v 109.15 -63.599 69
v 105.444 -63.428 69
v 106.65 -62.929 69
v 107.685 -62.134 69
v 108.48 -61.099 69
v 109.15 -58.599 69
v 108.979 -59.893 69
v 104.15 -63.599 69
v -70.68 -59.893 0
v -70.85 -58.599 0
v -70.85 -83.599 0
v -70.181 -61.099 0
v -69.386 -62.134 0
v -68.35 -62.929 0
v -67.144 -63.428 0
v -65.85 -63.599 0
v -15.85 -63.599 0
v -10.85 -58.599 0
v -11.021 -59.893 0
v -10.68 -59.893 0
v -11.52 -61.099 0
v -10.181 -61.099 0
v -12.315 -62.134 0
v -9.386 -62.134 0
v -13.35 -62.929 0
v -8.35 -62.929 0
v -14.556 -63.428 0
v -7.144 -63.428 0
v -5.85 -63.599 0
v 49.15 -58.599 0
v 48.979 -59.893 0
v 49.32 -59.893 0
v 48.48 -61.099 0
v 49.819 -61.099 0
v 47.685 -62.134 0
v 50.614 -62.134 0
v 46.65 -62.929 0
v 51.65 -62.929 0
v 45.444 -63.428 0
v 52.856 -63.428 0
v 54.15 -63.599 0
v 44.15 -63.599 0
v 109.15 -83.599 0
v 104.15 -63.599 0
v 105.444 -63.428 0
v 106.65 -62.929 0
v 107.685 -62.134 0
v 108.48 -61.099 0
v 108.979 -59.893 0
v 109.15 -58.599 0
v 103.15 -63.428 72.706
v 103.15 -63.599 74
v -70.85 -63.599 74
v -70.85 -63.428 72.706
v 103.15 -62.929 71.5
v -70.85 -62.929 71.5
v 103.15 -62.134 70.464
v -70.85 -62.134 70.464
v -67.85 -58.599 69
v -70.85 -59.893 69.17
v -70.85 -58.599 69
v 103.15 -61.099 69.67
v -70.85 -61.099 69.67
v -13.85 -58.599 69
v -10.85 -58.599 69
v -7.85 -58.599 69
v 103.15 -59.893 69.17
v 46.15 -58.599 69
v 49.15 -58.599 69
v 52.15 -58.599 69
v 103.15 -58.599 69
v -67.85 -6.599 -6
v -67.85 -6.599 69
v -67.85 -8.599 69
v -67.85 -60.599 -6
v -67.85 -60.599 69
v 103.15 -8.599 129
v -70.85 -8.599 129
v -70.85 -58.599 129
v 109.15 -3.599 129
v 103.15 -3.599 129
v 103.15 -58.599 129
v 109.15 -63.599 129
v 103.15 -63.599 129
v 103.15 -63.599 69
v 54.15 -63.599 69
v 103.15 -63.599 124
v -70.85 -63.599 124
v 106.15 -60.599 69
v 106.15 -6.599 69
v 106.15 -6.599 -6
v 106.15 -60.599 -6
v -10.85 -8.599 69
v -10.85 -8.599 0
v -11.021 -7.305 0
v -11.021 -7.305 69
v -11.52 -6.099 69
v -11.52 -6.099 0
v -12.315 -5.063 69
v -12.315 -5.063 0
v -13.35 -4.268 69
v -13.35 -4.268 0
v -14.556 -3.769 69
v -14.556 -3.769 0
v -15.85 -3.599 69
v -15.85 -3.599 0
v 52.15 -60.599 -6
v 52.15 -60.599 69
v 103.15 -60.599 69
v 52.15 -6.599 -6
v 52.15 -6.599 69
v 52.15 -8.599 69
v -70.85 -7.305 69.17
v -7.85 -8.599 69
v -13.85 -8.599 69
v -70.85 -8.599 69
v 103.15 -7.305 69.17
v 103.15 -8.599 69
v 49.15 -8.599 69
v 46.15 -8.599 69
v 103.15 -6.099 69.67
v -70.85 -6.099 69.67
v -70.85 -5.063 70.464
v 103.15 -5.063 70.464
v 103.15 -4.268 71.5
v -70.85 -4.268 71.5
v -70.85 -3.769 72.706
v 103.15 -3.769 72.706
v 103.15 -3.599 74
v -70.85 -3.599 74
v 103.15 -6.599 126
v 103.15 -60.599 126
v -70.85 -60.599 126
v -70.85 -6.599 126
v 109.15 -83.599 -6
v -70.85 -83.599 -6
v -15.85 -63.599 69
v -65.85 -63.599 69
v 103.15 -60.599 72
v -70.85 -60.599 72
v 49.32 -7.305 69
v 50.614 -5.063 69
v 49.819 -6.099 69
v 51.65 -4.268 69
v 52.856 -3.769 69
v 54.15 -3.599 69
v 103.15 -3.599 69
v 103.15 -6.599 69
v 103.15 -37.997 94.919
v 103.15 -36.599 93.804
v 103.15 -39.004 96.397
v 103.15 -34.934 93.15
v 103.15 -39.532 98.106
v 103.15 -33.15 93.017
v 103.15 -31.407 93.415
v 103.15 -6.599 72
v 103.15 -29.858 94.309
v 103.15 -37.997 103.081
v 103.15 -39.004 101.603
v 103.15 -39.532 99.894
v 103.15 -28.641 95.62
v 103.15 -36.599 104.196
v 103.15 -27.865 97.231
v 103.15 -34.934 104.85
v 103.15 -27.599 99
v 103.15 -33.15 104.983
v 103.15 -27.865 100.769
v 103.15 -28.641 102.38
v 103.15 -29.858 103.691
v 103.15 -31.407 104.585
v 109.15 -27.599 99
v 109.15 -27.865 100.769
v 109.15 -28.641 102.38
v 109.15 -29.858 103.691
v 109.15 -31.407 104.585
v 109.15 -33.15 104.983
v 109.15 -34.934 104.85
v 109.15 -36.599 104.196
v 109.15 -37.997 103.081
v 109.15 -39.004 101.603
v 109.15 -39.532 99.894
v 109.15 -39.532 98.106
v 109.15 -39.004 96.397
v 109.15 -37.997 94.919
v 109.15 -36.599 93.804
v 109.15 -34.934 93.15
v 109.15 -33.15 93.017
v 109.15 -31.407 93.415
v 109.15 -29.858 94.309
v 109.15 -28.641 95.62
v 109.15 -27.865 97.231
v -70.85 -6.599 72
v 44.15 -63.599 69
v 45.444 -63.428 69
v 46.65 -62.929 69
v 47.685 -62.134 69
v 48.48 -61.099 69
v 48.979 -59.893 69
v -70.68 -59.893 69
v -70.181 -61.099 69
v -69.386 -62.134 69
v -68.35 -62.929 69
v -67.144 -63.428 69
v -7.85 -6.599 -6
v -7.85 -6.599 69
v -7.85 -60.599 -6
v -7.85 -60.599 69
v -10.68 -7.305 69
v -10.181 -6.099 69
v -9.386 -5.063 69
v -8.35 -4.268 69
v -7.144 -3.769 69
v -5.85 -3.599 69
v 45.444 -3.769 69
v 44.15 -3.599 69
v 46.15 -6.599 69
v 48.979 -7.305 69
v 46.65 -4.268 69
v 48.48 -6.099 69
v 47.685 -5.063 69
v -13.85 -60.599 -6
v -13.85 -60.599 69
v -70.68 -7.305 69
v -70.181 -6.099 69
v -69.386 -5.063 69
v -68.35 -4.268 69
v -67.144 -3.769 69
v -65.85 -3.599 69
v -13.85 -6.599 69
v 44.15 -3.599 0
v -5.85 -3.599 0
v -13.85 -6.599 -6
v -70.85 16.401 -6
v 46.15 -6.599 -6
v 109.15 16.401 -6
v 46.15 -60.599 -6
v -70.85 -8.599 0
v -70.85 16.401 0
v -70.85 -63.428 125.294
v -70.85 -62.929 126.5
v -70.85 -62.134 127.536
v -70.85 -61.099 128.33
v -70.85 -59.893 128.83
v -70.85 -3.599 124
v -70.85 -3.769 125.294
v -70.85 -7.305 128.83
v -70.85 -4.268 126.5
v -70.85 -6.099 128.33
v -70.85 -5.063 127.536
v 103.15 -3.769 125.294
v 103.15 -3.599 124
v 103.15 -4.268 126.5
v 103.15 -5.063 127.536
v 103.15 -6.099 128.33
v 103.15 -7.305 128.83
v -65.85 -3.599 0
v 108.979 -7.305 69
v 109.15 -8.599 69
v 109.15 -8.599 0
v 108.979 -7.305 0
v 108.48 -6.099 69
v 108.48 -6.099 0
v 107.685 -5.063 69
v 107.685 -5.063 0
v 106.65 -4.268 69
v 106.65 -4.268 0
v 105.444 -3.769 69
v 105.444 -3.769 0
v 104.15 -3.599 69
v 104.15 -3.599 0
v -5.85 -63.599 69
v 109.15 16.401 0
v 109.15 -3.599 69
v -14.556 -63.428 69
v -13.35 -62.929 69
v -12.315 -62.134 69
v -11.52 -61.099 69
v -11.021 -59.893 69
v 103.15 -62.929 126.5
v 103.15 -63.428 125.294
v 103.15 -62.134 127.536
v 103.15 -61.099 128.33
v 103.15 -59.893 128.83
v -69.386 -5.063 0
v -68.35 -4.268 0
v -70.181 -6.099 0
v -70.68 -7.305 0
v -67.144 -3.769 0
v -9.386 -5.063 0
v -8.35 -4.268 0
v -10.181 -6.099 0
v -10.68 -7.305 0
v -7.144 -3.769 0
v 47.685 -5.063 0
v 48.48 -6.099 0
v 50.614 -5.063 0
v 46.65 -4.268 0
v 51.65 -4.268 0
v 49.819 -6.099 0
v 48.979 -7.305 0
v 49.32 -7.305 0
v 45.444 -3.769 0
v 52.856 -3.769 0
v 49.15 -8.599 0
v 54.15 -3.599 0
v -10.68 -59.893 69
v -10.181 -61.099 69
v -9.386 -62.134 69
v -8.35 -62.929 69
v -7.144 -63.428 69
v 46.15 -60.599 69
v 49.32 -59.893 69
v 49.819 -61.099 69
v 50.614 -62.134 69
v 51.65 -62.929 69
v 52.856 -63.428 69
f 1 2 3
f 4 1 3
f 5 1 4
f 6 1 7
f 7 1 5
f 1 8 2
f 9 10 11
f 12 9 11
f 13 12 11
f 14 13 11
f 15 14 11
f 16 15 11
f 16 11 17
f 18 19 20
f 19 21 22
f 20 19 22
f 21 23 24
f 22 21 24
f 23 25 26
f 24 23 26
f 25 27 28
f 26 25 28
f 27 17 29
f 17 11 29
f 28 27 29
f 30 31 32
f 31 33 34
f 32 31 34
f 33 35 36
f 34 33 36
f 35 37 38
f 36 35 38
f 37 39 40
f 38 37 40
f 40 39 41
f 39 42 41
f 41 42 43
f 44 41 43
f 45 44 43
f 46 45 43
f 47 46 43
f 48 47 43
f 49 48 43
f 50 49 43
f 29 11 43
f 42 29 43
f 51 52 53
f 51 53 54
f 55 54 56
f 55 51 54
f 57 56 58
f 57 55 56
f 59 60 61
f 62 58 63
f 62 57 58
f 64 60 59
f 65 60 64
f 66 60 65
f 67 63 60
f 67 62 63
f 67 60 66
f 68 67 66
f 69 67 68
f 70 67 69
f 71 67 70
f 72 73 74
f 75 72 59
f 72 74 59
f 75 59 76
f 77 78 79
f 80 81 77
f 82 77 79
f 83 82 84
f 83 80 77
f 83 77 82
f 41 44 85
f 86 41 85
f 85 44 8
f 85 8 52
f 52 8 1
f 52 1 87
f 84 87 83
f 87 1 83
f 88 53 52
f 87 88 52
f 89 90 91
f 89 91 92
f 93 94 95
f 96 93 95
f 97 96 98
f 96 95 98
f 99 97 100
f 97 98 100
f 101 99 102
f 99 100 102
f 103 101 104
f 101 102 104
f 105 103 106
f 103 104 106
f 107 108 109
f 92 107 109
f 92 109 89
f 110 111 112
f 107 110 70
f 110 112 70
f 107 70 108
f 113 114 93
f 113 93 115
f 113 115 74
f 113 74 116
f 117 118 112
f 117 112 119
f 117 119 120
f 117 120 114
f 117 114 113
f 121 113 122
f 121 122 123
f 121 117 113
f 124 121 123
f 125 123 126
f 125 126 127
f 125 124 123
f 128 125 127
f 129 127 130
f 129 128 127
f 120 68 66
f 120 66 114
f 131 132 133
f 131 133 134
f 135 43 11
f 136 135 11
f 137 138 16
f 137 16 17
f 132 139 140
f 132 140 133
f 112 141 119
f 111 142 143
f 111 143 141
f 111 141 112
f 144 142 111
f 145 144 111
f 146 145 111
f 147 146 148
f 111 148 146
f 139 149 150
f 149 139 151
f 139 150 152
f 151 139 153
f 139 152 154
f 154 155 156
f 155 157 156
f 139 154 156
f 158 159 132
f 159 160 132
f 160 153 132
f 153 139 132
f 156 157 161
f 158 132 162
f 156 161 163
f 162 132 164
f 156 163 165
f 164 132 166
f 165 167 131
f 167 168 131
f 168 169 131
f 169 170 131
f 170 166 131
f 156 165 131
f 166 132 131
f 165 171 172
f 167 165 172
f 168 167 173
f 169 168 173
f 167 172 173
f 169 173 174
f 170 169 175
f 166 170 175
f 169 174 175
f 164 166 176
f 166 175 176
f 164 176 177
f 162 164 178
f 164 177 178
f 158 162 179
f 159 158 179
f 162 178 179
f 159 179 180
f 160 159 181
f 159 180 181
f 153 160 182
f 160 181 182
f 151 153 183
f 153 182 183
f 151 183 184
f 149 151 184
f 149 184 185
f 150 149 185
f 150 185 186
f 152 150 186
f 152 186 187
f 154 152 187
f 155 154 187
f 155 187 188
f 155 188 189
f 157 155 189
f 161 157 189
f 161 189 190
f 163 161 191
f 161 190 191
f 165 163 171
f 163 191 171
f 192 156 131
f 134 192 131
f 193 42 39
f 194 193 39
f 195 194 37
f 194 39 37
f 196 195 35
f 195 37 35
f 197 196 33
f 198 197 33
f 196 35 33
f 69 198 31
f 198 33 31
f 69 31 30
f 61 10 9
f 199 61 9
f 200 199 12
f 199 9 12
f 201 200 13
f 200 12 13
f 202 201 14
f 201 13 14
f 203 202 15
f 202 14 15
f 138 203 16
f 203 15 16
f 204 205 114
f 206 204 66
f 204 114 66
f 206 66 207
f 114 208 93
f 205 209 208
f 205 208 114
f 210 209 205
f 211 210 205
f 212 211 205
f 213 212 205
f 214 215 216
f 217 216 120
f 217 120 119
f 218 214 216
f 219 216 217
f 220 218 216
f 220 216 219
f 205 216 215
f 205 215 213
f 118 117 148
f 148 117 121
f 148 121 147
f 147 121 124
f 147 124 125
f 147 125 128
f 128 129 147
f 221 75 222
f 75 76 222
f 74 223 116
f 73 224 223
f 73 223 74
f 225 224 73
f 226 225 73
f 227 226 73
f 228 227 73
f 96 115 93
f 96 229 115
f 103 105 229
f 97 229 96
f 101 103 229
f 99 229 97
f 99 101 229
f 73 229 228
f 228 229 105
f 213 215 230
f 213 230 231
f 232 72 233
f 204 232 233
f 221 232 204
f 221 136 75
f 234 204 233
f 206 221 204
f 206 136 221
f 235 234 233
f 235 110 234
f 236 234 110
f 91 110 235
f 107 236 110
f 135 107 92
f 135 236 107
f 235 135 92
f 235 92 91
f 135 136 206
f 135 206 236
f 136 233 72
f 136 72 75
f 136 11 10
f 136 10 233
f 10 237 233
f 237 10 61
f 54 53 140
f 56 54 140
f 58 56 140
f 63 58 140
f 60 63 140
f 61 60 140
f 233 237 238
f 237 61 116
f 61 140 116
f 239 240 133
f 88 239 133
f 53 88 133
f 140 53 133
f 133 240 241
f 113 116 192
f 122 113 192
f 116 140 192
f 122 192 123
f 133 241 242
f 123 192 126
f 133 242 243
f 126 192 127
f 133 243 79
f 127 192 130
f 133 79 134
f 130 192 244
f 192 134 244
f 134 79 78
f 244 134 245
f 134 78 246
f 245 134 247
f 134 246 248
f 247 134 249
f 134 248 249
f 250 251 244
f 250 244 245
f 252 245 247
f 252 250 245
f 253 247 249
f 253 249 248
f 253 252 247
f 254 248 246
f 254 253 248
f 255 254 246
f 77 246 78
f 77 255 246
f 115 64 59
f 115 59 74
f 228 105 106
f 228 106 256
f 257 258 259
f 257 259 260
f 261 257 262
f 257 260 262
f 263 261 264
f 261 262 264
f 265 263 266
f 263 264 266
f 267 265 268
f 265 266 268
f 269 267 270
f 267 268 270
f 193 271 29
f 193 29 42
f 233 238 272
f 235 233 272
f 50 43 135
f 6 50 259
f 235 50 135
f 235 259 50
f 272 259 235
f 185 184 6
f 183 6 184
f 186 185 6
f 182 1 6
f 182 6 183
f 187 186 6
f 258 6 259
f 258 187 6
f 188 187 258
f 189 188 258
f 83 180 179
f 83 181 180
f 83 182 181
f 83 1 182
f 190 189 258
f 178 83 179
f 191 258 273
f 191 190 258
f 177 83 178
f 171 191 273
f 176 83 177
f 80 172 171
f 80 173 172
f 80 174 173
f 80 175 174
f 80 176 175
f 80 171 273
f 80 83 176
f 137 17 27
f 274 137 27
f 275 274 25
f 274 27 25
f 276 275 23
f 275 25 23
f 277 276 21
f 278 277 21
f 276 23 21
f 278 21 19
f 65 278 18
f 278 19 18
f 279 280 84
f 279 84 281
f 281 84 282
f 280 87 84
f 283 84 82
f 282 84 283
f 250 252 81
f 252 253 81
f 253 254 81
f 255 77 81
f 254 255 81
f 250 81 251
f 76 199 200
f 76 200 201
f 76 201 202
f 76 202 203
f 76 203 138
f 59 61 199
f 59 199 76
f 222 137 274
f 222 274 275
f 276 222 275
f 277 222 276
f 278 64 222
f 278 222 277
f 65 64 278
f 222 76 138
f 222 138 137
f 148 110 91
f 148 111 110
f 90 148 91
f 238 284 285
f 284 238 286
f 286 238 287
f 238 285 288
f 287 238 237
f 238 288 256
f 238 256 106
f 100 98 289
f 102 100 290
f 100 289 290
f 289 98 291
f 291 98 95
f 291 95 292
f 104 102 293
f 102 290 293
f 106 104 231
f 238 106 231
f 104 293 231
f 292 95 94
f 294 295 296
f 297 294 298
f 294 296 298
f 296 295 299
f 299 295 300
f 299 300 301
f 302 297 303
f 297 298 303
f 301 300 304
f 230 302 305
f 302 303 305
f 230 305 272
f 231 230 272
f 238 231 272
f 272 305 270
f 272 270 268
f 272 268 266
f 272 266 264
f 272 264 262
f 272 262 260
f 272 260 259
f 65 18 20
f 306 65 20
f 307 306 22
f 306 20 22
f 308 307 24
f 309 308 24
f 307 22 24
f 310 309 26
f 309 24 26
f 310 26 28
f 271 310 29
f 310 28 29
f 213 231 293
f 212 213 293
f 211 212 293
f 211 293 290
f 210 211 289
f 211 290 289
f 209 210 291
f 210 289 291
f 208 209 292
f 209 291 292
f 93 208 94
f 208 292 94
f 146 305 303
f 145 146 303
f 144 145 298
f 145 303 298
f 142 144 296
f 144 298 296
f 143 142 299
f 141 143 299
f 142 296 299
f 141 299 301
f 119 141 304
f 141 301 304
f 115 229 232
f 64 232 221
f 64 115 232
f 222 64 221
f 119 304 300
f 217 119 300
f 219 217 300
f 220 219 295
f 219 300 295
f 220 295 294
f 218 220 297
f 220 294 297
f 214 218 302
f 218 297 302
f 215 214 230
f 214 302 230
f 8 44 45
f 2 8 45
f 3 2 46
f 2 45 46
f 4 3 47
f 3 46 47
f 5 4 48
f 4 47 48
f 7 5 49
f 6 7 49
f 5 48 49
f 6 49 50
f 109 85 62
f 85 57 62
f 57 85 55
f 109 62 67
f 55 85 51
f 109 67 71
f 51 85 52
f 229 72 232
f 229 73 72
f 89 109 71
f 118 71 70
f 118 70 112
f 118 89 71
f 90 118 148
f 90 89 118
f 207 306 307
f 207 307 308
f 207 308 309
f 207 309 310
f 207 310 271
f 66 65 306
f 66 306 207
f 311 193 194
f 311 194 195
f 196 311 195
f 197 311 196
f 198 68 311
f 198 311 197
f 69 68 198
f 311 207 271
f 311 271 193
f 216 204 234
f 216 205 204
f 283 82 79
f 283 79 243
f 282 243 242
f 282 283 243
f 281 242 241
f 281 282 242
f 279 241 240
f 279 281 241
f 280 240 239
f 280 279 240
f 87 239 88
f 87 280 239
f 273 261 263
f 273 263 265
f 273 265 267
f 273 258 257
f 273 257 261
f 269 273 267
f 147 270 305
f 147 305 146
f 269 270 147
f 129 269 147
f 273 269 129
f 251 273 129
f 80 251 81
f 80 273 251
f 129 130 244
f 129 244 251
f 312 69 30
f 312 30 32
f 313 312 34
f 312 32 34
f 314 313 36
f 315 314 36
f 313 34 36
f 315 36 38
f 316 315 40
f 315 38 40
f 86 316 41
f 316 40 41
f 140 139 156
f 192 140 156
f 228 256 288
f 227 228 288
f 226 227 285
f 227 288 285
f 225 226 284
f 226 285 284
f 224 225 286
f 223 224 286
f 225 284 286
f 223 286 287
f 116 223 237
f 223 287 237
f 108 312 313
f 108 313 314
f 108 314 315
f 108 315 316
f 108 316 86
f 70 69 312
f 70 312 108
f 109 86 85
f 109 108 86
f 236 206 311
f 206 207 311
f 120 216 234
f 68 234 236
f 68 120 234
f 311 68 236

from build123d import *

# Parameters (mm, degrees)
F0_W     = 54
F0_H     = 54
F1_DEPTH = 69
F2_W     = 54
F2_H     = 54
F3_DEPTH = 6
F4_W     = 54
F4_H     = 54
F5_DEPTH = 180
F6_W     = 60
F6_H     = 60
F6_R     = 6
F7_DEPTH = 6


with BuildPart() as f1:
    # F0 (on Top) → F1 (new body)
    with BuildSketch(Plane.XY):
        with BuildLine():
            ThreePointArc((-10.85040465, -8.5986092687), (-12.314870744, -5.0630753627), (-15.85040465, -3.5986092687))
            Line((-15.85040465, -3.5986092687), (-65.85040465, -3.5986092687))
            ThreePointArc((-65.85040465, -3.5986092687), (-69.3859385559, -5.0630753627), (-70.85040465, -8.5986092687))
            Line((-70.85040465, -8.5986092687), (-70.85040465, -58.5986092687))
            ThreePointArc((-70.85040465, -58.5986092687), (-69.3859385559, -62.1341431746), (-65.85040465, -63.5986092687))
            Line((-65.85040465, -63.5986092687), (-15.85040465, -63.5986092687))
            ThreePointArc((-15.85040465, -63.5986092687), (-12.314870744, -62.1341431746), (-10.85040465, -58.5986092687))
            Line((-10.85040465, -58.5986092687), (-10.85040465, -8.5986092687))
        make_face()
        with Locations((-40.85040465, -33.5986092687)):
            Rectangle(F0_W, F0_H, mode=Mode.SUBTRACT)
        with BuildLine():
            ThreePointArc((-5.85040465, -3.5986092687), (-9.3859385559, -5.0630753627), (-10.85040465, -8.5986092687))
            Line((-10.85040465, -8.5986092687), (-10.85040465, -58.5986092687))
            ThreePointArc((-10.85040465, -58.5986092687), (-9.3859385559, -62.1341431746), (-5.85040465, -63.5986092687))
            Line((-5.85040465, -63.5986092687), (44.14959535, -63.5986092687))
            ThreePointArc((44.14959535, -63.5986092687), (47.685129256, -62.1341431746), (49.14959535, -58.5986092687))
            Line((49.14959535, -58.5986092687), (49.14959535, -8.5986092687))
            ThreePointArc((49.14959535, -8.5986092687), (47.685129256, -5.0630753627), (44.14959535, -3.5986092687))
            Line((44.14959535, -3.5986092687), (-5.85040465, -3.5986092687))
        make_face()
        with Locations((19.14959535, -33.5986092687)):
            Rectangle(F0_W, F0_H, mode=Mode.SUBTRACT)
        with BuildLine():
            ThreePointArc((54.14959535, -3.5986092687), (50.6140614441, -5.0630753627), (49.14959535, -8.5986092687))
            Line((49.14959535, -8.5986092687), (49.14959535, -58.5986092687))
            ThreePointArc((49.14959535, -58.5986092687), (50.6140614441, -62.1341431746), (54.14959535, -63.5986092687))
            Line((54.14959535, -63.5986092687), (104.14959535, -63.5986092687))
            ThreePointArc((104.14959535, -63.5986092687), (107.685129256, -62.1341431746), (109.14959535, -58.5986092687))
            Line((109.14959535, -58.5986092687), (109.14959535, -8.5986092687))
            ThreePointArc((109.14959535, -8.5986092687), (107.685129256, -5.0630753627), (104.14959535, -3.5986092687))
            Line((104.14959535, -3.5986092687), (54.14959535, -3.5986092687))
        make_face()
        with Locations((79.14959535, -33.5986092687)):
            Rectangle(F0_W, F0_H, mode=Mode.SUBTRACT)
    extrude(amount=F1_DEPTH)

    # F2 (on face) → F3 (join)
    with BuildSketch(Plane(origin=(0, 0, 0), x_dir=(1, 0, 0), z_dir=(0, 0, -1))):
        with BuildLine():
            Line((-70.85040465, -16.4013907313), (109.14959535, -16.4013907313))
            Line((109.14959535, -16.4013907313), (109.14959535, 8.5986092687))
            ThreePointArc((109.14959535, 8.5986092687), (107.685129256, 5.0630753627), (104.14959535, 3.5986092687))
            Line((104.14959535, 3.5986092687), (54.14959535, 3.5986092687))
            ThreePointArc((54.14959535, 3.5986092687), (50.6140614441, 5.0630753627), (49.14959535, 8.5986092687))
            ThreePointArc((49.14959535, 8.5986092687), (47.685129256, 5.0630753627), (44.14959535, 3.5986092687))
            Line((44.14959535, 3.5986092687), (-5.85040465, 3.5986092687))
            ThreePointArc((-5.85040465, 3.5986092687), (-9.3859385559, 5.0630753627), (-10.85040465, 8.5986092687))
            ThreePointArc((-10.85040465, 8.5986092687), (-12.314870744, 5.0630753627), (-15.85040465, 3.5986092687))
            Line((-15.85040465, 3.5986092687), (-65.85040465, 3.5986092687))
            ThreePointArc((-65.85040465, 3.5986092687), (-69.3859385559, 5.0630753627), (-70.85040465, 8.5986092687))
            Line((-70.85040465, 8.5986092687), (-70.85040465, -16.4013907313))
        make_face()
        with BuildLine():
            ThreePointArc((104.14959535, 63.5986092687), (107.685129256, 62.1341431746), (109.14959535, 58.5986092687))
            Line((109.14959535, 58.5986092687), (109.14959535, 83.5986092687))
            Line((109.14959535, 83.5986092687), (-70.85040465, 83.5986092687))
            Line((-70.85040465, 83.5986092687), (-70.85040465, 58.5986092687))
            ThreePointArc((-70.85040465, 58.5986092687), (-69.3859385559, 62.1341431746), (-65.85040465, 63.5986092687))
            Line((-65.85040465, 63.5986092687), (-15.85040465, 63.5986092687))
            ThreePointArc((-15.85040465, 63.5986092687), (-12.314870744, 62.1341431746), (-10.85040465, 58.5986092687))
            ThreePointArc((-10.85040465, 58.5986092687), (-9.3859385559, 62.1341431746), (-5.85040465, 63.5986092687))
            Line((-5.85040465, 63.5986092687), (44.14959535, 63.5986092687))
            ThreePointArc((44.14959535, 63.5986092687), (47.685129256, 62.1341431746), (49.14959535, 58.5986092687))
            ThreePointArc((49.14959535, 58.5986092687), (50.6140614441, 62.1341431746), (54.14959535, 63.5986092687))
            Line((54.14959535, 63.5986092687), (104.14959535, 63.5986092687))
        make_face()
        with BuildLine():
            ThreePointArc((104.14959535, 3.5986092687), (107.685129256, 5.0630753627), (109.14959535, 8.5986092687))
            Line((109.14959535, 8.5986092687), (109.14959535, 58.5986092687))
            ThreePointArc((109.14959535, 58.5986092687), (107.685129256, 62.1341431746), (104.14959535, 63.5986092687))
            Line((104.14959535, 63.5986092687), (54.14959535, 63.5986092687))
            ThreePointArc((54.14959535, 63.5986092687), (50.6140614441, 62.1341431746), (49.14959535, 58.5986092687))
            ThreePointArc((49.14959535, 58.5986092687), (47.685129256, 62.1341431746), (44.14959535, 63.5986092687))
            Line((44.14959535, 63.5986092687), (-5.85040465, 63.5986092687))
            ThreePointArc((-5.85040465, 63.5986092687), (-9.3859385559, 62.1341431746), (-10.85040465, 58.5986092687))
            ThreePointArc((-10.85040465, 58.5986092687), (-12.314870744, 62.1341431746), (-15.85040465, 63.5986092687))
            Line((-15.85040465, 63.5986092687), (-65.85040465, 63.5986092687))
            ThreePointArc((-65.85040465, 63.5986092687), (-69.3859385559, 62.1341431746), (-70.85040465, 58.5986092687))
            Line((-70.85040465, 58.5986092687), (-70.85040465, 8.5986092687))
            ThreePointArc((-70.85040465, 8.5986092687), (-69.3859385559, 5.0630753627), (-65.85040465, 3.5986092687))
            Line((-65.85040465, 3.5986092687), (-15.85040465, 3.5986092687))
            ThreePointArc((-15.85040465, 3.5986092687), (-12.314870744, 5.0630753627), (-10.85040465, 8.5986092687))
            ThreePointArc((-10.85040465, 8.5986092687), (-9.3859385559, 5.0630753627), (-5.85040465, 3.5986092687))
            Line((-5.85040465, 3.5986092687), (44.14959535, 3.5986092687))
            ThreePointArc((44.14959535, 3.5986092687), (47.685129256, 5.0630753627), (49.14959535, 8.5986092687))
            ThreePointArc((49.14959535, 8.5986092687), (50.6140614441, 5.0630753627), (54.14959535, 3.5986092687))
            Line((54.14959535, 3.5986092687), (104.14959535, 3.5986092687))
        make_face()
        with Locations((-40.85040465, 33.5986092687)):
            Rectangle(F2_W, F2_H, mode=Mode.SUBTRACT)
        with Locations((19.14959535, 33.5986092687)):
            Rectangle(F2_W, F2_H, mode=Mode.SUBTRACT)
        with Locations((79.14959535, 33.5986092687)):
            Rectangle(F2_W, F2_H, mode=Mode.SUBTRACT)
    extrude(amount=F3_DEPTH)

    # F4 (on face) → F5 (join, through all)
    with BuildSketch(Plane.YZ.offset(109.14959535)):
        with BuildLine():
            ThreePointArc((-3.5986092687, 124), (-5.0630753627, 127.5355339059), (-8.5986092687, 129))
            Line((-8.5986092687, 129), (-58.5986092687, 129))
            ThreePointArc((-58.5986092687, 129), (-62.1341431746, 127.5355339059), (-63.5986092687, 124))
            Line((-63.5986092687, 124), (-63.5986092687, 74))
            ThreePointArc((-63.5986092687, 74), (-62.1341431746, 70.4644660941), (-58.5986092687, 69))
            Line((-58.5986092687, 69), (-8.5986092687, 69))
            ThreePointArc((-8.5986092687, 69), (-5.0630753627, 70.4644660941), (-3.5986092687, 74))
            Line((-3.5986092687, 74), (-3.5986092687, 124))
        make_face()
        with Locations((-33.5986092687, 99)):
            Rectangle(F4_W, F4_H, mode=Mode.SUBTRACT)
    extrude(amount=-F5_DEPTH)

    # F6 (on face) → F7 (join)
    with BuildSketch(Plane.YZ.offset(109.14959535)):
        with Locations((-33.5986092687, 99)):
            Rectangle(F6_W, F6_H)
        with Locations((-33.5986092687, 99)):
            Circle(F6_R, mode=Mode.SUBTRACT)
    extrude(amount=-F7_DEPTH)


solid = f1.part
